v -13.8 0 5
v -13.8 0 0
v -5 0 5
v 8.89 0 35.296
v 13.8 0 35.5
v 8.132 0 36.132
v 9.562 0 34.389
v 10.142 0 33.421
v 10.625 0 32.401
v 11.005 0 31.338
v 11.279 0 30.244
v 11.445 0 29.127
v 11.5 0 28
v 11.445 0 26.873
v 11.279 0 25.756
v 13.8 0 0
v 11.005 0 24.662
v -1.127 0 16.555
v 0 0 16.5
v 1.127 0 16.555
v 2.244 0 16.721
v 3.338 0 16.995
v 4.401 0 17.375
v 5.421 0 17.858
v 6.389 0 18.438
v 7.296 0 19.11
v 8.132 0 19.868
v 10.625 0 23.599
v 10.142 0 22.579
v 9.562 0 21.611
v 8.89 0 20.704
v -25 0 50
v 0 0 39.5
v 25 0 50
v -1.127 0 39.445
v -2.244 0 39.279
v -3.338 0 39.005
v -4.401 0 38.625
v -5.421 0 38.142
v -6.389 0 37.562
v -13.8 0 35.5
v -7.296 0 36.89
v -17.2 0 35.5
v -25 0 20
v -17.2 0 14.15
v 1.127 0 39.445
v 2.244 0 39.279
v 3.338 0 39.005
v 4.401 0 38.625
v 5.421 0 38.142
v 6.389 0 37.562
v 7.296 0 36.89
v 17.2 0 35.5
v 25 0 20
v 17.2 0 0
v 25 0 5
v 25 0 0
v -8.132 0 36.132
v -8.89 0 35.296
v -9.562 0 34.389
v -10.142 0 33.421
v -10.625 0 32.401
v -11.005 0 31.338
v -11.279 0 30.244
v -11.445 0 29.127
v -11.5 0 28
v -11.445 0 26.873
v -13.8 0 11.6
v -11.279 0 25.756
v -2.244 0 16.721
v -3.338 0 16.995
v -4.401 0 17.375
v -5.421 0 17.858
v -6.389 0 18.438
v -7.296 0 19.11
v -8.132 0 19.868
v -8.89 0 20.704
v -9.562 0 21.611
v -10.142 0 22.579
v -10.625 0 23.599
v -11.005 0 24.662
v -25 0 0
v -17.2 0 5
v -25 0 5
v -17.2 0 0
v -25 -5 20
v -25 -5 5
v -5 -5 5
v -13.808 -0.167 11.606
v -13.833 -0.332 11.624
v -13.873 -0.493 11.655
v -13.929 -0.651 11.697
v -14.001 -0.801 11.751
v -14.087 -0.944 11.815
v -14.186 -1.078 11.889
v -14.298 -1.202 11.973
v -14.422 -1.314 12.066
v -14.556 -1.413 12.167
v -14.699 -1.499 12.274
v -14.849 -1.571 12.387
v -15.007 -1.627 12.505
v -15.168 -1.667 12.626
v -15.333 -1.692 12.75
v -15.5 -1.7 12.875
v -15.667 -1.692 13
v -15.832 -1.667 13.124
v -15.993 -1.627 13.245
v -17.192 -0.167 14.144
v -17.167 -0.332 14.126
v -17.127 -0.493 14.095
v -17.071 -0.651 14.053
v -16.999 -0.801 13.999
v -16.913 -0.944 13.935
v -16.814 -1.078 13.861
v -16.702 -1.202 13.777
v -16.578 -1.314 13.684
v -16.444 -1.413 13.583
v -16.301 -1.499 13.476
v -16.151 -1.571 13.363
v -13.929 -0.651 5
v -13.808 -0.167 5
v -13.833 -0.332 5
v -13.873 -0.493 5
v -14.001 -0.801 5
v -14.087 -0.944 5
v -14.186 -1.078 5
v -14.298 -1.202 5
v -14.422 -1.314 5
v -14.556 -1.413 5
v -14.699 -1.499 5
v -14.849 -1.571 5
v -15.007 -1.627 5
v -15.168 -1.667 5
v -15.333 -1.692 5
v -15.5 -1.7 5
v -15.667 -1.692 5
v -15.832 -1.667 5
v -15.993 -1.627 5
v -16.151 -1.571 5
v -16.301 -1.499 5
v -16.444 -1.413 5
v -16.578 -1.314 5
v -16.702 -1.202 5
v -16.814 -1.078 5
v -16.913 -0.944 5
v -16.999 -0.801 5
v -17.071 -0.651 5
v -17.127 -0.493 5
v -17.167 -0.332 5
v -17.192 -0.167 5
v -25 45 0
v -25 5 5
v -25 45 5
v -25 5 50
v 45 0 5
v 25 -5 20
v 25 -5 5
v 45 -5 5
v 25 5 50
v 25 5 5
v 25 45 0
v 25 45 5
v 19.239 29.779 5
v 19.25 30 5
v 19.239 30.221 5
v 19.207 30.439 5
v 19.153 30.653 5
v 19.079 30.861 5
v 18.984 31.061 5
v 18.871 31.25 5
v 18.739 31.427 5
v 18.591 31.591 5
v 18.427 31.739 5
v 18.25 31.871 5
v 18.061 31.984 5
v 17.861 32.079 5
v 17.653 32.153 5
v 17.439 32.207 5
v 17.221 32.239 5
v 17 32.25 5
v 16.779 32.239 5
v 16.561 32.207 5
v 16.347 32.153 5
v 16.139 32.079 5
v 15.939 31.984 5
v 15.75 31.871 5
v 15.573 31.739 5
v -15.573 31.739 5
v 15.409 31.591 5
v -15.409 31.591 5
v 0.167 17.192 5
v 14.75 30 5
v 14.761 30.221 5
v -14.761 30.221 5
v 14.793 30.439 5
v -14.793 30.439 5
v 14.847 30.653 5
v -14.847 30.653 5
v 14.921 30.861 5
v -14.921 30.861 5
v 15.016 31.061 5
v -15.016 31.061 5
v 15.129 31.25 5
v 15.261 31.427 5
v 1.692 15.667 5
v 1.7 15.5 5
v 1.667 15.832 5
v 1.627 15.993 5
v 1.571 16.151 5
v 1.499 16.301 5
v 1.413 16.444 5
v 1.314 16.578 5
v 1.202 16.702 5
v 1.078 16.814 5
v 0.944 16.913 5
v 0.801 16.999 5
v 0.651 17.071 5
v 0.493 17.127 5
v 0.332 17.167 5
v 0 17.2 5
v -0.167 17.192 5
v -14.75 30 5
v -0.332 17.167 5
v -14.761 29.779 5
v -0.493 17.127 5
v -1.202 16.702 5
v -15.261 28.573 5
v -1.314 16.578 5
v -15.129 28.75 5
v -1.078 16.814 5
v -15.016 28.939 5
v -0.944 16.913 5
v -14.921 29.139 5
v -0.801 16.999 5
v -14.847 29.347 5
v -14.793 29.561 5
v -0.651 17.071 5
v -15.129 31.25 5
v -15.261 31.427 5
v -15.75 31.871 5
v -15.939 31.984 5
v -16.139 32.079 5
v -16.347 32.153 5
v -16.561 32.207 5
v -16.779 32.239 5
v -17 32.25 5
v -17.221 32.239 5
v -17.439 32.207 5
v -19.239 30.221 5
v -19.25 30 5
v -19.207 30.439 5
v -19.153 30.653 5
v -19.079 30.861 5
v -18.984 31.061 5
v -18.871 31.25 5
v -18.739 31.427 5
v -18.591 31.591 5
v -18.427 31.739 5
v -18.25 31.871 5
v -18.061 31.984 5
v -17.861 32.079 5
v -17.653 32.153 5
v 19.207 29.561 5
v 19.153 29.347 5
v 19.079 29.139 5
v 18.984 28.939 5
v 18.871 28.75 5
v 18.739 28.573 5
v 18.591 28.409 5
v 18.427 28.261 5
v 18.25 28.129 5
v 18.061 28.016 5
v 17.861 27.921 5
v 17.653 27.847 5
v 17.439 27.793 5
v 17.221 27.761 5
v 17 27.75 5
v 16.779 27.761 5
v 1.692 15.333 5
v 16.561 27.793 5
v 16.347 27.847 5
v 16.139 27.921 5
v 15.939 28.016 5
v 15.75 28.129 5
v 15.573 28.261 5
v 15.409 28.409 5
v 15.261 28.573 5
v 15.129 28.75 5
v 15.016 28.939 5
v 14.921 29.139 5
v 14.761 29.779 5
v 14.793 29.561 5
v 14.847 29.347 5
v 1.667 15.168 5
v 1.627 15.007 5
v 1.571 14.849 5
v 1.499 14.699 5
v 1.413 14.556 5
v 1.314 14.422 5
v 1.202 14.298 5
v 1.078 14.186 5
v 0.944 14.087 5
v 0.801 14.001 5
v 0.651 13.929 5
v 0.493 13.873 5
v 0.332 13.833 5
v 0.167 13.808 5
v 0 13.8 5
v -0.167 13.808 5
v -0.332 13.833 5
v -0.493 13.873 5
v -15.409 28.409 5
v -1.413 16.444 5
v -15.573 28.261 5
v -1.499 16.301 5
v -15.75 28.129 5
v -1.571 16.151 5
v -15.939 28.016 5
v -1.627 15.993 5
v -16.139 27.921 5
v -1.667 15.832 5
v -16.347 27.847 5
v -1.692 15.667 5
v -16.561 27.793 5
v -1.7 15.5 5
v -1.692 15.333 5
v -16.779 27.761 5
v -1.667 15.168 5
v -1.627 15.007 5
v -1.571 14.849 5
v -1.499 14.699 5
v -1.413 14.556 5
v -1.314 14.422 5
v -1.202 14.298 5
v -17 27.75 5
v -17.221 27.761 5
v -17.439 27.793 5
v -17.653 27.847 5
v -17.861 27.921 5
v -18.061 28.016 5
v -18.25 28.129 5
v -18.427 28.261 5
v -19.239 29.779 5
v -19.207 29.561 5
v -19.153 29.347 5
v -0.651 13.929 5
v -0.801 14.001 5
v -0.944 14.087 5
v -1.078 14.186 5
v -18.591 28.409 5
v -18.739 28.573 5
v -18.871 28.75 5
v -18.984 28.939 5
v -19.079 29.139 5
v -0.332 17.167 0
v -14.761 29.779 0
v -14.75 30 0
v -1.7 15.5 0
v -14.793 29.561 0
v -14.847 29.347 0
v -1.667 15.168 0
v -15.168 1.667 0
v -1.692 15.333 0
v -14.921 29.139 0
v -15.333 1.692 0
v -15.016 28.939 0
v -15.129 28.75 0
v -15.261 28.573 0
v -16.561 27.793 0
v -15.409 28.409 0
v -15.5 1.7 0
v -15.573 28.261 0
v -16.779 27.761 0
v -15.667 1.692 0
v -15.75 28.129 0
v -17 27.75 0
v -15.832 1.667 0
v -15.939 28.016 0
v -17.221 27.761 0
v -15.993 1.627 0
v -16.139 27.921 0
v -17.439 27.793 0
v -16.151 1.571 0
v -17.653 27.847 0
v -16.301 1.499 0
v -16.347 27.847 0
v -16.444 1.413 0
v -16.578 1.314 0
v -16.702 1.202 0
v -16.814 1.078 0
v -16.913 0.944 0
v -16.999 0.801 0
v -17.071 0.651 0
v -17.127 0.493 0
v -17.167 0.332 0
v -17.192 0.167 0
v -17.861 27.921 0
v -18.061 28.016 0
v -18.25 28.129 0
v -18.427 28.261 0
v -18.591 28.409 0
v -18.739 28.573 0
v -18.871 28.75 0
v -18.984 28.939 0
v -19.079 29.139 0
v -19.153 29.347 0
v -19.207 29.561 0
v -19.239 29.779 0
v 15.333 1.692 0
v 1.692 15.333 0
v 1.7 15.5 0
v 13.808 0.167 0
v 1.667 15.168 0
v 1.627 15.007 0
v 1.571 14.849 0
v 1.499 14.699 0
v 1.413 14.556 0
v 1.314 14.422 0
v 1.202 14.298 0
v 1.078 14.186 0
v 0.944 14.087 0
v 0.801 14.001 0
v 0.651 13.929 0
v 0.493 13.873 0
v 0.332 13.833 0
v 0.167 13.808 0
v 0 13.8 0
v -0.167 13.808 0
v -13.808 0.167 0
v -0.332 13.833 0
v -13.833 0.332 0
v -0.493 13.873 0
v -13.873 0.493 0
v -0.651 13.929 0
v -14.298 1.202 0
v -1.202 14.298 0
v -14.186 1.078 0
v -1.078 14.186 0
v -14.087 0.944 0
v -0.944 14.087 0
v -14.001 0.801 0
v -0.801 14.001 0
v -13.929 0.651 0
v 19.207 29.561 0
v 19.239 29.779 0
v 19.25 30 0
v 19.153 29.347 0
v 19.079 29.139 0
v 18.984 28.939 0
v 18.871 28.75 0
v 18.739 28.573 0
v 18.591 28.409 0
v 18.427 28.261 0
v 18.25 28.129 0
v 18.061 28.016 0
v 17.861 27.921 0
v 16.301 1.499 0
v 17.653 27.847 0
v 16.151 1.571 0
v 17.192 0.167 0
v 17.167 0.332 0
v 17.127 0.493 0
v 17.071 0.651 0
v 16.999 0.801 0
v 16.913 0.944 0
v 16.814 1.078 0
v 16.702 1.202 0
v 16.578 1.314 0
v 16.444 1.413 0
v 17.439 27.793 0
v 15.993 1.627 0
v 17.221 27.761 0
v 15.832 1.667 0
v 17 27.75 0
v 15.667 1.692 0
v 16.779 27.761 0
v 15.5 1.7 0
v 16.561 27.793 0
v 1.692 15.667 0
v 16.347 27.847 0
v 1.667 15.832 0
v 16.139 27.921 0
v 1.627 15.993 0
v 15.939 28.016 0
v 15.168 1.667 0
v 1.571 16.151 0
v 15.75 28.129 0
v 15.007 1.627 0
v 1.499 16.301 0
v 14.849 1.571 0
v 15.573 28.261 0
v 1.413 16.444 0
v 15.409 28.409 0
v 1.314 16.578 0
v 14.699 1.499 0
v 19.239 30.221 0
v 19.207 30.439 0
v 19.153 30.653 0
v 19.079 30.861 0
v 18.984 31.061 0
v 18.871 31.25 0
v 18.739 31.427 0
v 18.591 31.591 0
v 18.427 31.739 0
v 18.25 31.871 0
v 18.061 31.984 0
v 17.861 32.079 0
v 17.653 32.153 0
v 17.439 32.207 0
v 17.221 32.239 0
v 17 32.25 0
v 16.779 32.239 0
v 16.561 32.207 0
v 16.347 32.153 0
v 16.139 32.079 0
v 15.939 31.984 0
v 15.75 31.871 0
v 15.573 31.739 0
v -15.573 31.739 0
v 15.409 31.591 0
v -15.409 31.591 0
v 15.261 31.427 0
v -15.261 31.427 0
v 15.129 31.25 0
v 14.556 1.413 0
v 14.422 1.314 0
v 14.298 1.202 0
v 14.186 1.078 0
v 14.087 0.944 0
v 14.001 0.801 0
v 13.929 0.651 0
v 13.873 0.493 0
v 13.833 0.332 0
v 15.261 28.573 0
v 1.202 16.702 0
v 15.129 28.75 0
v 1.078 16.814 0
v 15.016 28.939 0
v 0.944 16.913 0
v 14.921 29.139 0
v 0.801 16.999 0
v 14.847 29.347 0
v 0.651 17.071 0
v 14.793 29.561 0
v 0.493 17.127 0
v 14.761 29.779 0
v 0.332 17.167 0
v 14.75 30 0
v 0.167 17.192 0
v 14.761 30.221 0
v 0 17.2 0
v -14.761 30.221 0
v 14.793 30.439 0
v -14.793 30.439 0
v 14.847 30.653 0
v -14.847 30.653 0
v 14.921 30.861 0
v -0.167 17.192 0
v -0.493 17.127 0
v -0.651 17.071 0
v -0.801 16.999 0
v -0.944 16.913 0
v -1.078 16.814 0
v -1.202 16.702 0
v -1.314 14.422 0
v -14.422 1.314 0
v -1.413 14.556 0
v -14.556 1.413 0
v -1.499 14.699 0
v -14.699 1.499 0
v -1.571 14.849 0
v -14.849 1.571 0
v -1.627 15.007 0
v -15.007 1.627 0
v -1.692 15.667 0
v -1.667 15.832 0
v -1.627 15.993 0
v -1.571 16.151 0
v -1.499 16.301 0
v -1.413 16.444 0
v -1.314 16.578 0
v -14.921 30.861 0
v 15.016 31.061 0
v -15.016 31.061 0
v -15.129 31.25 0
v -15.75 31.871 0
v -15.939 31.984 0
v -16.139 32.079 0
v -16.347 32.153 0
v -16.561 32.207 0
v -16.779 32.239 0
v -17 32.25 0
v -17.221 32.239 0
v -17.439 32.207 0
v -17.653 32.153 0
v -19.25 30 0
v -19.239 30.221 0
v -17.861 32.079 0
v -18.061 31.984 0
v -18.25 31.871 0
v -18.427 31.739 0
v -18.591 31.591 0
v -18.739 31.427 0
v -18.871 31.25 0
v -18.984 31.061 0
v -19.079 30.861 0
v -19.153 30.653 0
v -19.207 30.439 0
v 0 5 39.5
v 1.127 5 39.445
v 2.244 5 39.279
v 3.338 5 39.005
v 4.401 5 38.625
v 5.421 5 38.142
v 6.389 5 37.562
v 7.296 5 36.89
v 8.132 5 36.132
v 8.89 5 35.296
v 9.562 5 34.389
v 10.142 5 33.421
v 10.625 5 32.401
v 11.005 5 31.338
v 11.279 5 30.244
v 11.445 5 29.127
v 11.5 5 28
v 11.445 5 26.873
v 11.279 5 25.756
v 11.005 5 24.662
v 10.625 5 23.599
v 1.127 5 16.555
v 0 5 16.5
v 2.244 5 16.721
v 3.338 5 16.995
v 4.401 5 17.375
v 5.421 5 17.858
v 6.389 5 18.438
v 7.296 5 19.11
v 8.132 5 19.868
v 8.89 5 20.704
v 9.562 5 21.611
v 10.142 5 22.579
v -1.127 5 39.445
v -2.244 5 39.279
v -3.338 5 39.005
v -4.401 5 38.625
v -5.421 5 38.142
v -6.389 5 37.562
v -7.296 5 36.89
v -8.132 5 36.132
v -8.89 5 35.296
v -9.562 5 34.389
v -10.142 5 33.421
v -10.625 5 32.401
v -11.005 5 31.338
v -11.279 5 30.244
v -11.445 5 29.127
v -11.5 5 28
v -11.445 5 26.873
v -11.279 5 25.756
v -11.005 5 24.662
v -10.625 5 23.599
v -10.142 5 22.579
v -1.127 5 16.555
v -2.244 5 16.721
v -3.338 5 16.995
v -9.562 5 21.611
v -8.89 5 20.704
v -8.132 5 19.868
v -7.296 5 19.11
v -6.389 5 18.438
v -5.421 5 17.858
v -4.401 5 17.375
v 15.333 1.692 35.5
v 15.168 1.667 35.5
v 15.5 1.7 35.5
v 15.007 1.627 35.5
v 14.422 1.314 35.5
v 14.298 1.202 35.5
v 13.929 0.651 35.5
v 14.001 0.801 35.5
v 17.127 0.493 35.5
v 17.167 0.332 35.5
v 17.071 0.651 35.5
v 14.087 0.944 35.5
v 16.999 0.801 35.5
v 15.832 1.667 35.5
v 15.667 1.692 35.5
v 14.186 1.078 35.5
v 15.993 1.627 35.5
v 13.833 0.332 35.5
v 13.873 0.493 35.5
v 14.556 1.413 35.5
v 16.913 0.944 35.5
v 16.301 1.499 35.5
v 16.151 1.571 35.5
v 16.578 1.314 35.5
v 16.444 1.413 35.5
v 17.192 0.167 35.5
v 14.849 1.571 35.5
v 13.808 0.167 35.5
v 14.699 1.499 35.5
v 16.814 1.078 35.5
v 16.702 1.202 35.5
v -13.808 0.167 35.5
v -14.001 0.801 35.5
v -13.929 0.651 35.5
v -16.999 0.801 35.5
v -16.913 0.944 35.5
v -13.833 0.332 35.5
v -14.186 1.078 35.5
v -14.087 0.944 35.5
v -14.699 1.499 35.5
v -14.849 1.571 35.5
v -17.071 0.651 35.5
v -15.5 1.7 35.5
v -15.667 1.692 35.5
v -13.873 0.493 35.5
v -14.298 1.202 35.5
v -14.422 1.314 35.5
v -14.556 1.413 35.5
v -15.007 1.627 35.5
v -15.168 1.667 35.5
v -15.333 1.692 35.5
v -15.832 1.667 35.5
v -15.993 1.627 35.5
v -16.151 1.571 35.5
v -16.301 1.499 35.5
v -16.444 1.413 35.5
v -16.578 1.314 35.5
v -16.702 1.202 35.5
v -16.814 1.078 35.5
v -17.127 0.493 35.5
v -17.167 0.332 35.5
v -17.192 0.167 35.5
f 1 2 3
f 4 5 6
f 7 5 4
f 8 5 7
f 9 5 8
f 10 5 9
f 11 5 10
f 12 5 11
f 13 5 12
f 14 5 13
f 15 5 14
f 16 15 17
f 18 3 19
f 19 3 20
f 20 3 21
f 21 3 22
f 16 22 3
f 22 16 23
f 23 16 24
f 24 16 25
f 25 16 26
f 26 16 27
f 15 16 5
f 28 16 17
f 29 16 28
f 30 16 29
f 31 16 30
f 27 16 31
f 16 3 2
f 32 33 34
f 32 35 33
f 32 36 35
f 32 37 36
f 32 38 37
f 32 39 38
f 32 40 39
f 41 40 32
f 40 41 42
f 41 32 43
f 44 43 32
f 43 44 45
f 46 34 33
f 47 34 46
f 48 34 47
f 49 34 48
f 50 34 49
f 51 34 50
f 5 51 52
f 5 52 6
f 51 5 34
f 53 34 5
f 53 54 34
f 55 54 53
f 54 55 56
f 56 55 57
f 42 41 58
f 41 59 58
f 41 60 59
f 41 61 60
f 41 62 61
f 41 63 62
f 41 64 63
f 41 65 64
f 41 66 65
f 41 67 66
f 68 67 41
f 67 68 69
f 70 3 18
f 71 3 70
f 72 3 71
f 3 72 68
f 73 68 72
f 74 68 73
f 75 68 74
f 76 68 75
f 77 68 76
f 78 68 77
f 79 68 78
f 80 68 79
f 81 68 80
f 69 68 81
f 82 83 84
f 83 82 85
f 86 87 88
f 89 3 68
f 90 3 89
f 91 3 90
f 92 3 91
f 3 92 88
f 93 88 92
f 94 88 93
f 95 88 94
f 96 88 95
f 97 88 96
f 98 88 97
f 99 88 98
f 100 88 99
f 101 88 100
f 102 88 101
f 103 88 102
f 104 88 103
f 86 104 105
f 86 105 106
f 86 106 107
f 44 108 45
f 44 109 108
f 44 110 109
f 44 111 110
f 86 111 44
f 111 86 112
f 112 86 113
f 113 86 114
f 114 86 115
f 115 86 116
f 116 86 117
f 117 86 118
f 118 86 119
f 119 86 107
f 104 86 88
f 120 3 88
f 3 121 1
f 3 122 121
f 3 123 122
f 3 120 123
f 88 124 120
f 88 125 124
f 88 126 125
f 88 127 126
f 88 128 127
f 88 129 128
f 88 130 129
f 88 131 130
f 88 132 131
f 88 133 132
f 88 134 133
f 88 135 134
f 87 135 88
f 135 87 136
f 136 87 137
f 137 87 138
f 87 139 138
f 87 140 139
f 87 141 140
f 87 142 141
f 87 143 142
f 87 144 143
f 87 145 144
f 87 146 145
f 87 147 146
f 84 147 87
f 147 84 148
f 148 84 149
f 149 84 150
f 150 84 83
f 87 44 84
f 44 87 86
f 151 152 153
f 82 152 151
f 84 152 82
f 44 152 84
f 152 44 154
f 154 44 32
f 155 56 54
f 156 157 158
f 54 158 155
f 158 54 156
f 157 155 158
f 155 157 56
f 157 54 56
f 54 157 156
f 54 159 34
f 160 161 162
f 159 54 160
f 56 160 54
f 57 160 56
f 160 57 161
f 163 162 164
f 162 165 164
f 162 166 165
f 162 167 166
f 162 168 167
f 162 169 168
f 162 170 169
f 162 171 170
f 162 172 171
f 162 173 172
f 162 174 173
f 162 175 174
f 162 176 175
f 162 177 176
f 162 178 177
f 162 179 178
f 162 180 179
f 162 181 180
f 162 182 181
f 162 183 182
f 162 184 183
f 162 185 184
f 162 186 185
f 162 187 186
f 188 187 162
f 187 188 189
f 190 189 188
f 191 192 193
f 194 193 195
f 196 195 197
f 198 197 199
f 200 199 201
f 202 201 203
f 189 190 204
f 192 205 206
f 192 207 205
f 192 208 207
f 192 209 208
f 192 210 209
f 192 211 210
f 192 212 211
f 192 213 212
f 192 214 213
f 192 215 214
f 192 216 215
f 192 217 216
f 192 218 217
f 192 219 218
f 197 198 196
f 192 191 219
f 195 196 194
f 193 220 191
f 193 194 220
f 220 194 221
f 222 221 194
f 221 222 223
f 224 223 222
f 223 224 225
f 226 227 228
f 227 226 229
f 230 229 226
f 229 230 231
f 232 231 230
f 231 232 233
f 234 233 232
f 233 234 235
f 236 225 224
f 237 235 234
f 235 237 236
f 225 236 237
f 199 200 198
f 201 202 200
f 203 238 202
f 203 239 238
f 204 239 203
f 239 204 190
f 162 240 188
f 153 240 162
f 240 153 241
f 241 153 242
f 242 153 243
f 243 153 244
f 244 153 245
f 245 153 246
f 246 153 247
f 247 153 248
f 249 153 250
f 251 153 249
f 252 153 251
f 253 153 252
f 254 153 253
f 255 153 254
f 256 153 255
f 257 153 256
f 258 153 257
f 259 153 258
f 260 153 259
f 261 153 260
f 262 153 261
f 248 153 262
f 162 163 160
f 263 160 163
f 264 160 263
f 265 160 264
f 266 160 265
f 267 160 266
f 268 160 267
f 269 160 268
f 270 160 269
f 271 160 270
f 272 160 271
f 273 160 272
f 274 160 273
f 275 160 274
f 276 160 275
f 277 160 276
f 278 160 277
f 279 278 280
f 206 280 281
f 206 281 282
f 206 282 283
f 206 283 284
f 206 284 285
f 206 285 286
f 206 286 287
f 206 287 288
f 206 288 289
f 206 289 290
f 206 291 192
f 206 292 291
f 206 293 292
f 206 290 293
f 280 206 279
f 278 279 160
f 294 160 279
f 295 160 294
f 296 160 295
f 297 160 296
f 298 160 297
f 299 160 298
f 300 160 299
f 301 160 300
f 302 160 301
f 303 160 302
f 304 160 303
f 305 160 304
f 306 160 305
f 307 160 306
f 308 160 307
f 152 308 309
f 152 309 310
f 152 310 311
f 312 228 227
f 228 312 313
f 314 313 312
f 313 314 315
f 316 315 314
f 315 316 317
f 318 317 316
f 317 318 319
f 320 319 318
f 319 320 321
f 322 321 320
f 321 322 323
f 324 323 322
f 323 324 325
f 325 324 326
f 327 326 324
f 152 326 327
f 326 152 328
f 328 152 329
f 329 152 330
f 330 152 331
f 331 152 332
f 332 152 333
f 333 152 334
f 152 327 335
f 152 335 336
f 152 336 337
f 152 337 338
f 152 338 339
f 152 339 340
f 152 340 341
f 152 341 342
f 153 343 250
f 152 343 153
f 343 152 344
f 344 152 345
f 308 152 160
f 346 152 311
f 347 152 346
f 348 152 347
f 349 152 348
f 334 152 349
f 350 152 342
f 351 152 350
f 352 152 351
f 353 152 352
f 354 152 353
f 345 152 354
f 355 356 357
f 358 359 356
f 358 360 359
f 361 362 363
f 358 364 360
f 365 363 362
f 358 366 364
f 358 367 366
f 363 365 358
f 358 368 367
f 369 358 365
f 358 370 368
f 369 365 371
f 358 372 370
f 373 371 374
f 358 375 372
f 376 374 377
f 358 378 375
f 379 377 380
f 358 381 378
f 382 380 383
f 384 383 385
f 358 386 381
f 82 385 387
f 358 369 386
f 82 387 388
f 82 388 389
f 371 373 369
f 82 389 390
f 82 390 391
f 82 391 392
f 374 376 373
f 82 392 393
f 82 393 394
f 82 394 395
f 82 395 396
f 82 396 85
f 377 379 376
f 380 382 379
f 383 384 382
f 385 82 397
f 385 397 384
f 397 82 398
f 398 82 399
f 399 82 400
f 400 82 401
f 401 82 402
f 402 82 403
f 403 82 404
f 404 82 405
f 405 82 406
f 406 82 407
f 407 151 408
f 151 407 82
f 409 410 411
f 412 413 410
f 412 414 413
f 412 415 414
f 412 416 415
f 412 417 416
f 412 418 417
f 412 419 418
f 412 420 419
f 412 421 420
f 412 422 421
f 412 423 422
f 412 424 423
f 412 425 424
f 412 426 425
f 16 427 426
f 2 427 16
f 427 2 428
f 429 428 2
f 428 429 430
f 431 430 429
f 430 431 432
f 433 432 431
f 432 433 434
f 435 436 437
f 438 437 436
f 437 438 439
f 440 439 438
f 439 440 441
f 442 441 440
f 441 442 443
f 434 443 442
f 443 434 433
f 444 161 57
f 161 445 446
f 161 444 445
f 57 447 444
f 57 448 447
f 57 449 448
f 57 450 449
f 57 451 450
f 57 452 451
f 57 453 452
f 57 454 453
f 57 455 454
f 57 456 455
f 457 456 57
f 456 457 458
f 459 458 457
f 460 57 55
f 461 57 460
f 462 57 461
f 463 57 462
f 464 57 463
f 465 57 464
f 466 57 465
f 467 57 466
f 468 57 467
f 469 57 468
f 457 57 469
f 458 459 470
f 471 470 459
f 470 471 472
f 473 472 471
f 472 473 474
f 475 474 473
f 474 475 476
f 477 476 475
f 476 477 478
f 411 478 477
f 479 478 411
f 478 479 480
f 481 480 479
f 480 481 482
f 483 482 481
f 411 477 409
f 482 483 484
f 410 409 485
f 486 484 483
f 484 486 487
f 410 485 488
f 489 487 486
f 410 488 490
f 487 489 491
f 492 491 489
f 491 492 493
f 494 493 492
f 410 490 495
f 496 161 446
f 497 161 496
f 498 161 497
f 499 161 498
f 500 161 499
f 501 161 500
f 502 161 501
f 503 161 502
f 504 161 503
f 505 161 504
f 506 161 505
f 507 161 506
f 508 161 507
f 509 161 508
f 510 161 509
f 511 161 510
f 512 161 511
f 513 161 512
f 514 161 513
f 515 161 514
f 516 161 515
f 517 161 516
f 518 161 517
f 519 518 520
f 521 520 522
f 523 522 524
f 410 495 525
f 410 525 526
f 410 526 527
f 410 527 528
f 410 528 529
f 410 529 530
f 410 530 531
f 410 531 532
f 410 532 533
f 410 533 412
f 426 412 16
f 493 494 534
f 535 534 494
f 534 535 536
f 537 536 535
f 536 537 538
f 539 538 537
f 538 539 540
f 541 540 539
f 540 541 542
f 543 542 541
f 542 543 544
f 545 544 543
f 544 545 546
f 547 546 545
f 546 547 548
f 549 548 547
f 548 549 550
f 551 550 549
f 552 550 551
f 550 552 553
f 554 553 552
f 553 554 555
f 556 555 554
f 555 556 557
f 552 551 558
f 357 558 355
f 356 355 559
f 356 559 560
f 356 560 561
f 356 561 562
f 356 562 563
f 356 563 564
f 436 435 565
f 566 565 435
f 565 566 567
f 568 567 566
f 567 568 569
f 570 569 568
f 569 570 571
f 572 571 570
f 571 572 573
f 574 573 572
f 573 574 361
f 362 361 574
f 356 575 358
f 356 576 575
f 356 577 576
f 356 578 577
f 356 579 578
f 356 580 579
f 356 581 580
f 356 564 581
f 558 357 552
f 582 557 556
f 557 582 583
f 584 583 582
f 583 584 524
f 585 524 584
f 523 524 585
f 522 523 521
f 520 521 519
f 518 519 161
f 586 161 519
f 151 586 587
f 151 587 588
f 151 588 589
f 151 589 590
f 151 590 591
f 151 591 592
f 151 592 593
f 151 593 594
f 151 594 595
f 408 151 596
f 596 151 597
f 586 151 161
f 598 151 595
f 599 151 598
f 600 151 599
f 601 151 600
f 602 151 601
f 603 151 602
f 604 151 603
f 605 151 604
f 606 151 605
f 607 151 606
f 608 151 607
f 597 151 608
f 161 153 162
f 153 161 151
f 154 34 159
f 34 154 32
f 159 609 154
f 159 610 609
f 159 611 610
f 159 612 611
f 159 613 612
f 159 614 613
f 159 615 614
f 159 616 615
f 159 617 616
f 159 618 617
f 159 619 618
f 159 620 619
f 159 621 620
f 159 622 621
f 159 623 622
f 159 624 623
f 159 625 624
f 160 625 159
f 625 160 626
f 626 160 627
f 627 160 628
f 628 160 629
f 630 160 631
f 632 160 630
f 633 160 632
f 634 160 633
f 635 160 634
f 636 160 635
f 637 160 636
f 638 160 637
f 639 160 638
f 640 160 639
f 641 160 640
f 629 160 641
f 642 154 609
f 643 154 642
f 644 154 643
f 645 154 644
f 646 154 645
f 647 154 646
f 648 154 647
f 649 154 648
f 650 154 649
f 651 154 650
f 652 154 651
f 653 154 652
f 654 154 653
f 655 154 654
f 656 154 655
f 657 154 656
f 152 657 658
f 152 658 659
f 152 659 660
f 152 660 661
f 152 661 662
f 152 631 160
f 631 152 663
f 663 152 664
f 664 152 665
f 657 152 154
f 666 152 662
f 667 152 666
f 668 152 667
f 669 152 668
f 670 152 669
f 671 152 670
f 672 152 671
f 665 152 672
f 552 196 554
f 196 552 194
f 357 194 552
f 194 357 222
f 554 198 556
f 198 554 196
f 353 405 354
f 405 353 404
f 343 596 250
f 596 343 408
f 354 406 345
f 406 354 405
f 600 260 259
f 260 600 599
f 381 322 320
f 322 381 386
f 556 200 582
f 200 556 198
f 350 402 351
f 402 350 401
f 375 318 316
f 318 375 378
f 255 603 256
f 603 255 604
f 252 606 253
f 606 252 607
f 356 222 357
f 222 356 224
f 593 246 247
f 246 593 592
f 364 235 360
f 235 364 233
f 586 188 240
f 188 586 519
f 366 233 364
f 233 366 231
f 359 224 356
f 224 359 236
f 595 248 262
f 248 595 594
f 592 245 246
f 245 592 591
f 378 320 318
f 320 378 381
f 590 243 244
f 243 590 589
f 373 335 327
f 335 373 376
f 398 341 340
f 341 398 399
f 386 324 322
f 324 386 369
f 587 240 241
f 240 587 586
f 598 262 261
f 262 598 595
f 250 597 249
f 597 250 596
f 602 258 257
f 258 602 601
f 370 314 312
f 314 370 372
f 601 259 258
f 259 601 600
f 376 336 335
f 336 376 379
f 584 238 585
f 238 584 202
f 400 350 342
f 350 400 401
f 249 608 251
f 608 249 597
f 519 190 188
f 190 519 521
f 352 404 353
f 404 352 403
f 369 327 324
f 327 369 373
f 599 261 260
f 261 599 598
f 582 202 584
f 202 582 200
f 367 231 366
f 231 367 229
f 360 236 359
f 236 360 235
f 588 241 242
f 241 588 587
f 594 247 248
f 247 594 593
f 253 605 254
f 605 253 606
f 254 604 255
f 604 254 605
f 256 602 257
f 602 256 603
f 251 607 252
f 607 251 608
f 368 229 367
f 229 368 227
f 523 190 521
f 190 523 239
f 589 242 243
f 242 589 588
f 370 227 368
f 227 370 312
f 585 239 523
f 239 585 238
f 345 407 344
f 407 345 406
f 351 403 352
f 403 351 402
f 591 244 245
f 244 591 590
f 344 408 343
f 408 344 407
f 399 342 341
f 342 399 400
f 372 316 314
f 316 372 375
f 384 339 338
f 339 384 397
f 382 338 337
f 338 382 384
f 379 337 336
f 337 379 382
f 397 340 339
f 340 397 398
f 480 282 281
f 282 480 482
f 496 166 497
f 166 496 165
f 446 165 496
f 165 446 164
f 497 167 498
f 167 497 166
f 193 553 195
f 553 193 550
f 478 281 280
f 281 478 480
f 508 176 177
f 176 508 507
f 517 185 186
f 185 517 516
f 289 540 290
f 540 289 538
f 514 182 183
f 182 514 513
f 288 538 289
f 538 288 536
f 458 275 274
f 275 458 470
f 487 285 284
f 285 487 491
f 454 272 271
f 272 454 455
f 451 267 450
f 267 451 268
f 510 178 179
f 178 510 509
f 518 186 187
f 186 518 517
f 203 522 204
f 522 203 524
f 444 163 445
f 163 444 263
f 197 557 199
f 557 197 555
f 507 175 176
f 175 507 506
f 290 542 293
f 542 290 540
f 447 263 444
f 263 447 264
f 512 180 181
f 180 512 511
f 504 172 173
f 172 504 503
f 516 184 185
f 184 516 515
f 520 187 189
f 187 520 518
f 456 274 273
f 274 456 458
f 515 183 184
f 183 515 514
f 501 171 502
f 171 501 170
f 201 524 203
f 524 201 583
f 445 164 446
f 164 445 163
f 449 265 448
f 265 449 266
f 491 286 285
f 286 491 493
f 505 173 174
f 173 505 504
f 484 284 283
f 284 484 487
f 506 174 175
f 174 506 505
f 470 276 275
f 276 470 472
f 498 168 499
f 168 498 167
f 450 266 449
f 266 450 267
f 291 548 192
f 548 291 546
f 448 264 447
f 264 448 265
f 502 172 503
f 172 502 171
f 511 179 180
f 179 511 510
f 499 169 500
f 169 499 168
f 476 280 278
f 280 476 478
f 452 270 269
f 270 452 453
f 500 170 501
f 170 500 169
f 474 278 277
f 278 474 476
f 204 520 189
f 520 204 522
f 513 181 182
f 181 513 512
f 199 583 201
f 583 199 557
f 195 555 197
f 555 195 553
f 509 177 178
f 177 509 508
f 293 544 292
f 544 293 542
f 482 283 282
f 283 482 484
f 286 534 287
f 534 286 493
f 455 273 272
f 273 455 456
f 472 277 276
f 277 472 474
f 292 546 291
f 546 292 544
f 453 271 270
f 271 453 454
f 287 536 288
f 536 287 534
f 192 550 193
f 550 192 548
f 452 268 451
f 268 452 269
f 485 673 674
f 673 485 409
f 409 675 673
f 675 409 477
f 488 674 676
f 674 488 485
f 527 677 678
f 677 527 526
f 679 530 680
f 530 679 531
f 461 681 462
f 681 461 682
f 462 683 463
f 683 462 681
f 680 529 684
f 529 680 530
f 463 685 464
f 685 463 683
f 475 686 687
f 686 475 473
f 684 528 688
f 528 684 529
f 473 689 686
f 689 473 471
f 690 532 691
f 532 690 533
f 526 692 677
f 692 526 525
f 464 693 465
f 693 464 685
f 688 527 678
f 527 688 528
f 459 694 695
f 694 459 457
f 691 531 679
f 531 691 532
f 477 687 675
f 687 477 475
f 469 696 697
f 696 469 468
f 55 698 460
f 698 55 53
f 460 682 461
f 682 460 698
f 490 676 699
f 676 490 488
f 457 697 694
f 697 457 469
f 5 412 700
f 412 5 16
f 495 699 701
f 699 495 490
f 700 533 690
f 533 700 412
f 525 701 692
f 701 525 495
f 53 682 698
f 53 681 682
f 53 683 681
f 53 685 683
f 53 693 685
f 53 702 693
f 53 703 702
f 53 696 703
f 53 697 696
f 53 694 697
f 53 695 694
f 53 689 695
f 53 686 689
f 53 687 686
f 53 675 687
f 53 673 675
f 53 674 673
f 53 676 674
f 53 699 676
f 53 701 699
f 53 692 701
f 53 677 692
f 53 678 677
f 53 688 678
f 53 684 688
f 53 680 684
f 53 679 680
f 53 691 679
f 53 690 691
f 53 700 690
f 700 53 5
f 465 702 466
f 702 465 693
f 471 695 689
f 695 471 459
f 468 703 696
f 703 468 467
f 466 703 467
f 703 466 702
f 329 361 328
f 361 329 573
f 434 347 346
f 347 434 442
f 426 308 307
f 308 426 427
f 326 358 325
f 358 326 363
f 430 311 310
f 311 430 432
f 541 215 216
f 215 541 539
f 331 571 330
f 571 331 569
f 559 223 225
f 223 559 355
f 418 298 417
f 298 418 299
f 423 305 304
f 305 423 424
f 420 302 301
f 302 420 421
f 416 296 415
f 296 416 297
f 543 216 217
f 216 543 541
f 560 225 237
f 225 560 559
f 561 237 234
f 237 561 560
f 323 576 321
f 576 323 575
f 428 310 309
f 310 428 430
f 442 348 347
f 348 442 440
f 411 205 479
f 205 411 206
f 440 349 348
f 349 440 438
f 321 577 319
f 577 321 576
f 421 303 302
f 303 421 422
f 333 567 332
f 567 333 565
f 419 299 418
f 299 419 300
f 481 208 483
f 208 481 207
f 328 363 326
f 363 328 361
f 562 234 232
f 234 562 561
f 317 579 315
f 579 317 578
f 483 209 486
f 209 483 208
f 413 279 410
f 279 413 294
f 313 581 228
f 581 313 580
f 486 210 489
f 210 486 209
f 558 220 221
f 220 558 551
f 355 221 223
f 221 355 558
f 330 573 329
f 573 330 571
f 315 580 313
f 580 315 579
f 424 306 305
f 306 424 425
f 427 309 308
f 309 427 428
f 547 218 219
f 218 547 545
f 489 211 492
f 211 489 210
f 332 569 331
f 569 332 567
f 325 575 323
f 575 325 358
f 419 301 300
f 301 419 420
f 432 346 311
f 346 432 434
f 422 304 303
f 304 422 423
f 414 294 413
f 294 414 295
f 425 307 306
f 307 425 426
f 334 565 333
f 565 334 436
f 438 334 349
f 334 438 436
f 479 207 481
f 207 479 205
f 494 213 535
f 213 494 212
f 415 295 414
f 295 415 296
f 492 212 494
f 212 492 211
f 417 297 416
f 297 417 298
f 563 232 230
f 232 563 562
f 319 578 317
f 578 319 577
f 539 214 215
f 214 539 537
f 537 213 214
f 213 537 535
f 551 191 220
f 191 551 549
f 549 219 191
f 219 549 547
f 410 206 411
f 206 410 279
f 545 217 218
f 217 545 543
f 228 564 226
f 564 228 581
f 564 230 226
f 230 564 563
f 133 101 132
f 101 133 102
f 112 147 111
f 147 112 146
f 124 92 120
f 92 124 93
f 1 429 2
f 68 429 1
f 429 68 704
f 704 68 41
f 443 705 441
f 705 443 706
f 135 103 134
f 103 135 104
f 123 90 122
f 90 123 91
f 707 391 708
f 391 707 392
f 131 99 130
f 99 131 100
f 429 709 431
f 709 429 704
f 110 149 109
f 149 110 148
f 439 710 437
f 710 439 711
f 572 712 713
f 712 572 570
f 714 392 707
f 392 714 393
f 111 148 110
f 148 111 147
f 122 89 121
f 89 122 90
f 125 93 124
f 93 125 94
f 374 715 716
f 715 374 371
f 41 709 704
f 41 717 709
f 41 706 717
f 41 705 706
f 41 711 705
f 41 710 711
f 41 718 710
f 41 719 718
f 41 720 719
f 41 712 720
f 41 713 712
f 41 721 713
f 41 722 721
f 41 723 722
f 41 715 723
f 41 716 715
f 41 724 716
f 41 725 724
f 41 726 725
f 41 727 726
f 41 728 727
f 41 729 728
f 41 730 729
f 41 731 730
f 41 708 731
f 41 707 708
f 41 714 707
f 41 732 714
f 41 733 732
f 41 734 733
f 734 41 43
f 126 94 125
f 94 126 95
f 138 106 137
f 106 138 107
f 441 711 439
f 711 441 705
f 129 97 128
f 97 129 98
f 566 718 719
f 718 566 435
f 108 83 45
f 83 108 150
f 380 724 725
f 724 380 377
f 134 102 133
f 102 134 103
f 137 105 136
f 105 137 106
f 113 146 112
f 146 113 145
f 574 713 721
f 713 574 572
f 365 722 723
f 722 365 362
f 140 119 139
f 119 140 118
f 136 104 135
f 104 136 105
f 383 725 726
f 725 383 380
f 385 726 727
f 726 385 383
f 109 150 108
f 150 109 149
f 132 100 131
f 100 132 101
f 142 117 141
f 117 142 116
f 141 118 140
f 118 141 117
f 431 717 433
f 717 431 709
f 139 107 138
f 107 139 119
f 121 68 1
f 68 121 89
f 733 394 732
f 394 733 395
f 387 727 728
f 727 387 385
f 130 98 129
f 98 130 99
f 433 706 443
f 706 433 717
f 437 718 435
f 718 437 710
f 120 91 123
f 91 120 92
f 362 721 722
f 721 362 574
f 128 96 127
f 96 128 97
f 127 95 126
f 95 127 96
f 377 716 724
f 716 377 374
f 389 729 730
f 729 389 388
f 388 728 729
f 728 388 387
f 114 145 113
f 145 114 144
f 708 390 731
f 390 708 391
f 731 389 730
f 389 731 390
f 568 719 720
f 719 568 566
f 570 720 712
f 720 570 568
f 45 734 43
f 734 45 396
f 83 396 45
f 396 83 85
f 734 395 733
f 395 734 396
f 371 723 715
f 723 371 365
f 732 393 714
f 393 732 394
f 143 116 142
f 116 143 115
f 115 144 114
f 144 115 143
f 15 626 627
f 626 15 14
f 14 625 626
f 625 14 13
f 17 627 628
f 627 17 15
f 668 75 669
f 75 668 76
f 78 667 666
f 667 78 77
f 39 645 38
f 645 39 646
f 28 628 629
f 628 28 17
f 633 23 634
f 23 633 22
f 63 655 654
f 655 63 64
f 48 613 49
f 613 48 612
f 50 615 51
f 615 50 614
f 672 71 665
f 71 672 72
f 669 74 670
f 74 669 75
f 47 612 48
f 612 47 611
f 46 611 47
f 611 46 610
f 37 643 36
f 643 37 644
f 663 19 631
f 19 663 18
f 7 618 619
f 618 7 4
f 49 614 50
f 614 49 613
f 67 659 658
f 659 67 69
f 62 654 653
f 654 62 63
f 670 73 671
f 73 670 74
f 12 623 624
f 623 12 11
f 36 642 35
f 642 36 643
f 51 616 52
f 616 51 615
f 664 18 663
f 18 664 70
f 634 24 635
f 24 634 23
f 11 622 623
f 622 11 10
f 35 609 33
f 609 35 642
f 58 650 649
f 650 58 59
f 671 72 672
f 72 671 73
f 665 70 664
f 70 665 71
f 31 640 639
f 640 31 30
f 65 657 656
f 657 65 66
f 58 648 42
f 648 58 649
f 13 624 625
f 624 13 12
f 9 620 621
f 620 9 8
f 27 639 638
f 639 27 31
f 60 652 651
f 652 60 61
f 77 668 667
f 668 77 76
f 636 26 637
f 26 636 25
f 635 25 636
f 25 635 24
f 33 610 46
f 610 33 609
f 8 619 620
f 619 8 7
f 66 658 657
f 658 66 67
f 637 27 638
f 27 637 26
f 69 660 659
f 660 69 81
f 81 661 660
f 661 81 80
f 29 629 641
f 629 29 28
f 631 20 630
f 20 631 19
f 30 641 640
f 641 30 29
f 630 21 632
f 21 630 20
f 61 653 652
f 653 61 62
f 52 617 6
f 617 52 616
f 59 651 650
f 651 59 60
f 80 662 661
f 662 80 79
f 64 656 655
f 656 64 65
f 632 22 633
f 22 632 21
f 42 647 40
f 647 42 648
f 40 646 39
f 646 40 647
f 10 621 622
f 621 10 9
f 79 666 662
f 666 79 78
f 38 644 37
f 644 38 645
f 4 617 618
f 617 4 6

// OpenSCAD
// L-shaped mounting bracket for a NEMA 17 stepper motor (e.g. syringe pump)
// Print orientation: base plate on the bed, motor plate building upward (+Z)

$fn = 64;

// ---------------- Dimensions (mm) ----------------
// Base plate
base_x0 = -25;    // base plate x start
base_x1 = 25;     // base plate x end
base_y0 = 0;      // base plate y start
base_y1 = 45;     // base plate y end
base_z1 = 5;      // base plate thickness (z 0..5)

// Motor plate
motor_x0 = -25;   // motor plate x start
motor_x1 = 25;    // motor plate x end
motor_y0 = 0;     // motor plate y start
motor_y1 = 5;     // motor plate y end (z 0..50)
motor_z1 = 50;    // motor plate height

// Through-holes
hole_m4_x = [-17, 17]; // M4 holes at x = -17 and x = 17
hole_m4_y = 30;      // M4 holes at y = 30
hole_m4_d = 4.5;    // M4 hole diameter

// Motor boss hole
boss_d = 23;       // boss hole diameter (along Y)
boss_x = 0;        // boss hole centre x
boss_z = 28;       // boss hole centre z

// Screw holes
screw_d = 3.4;     // M3 screw hole diameter
screw_pitch = 31;  // square pattern side length
screw_count = 4;   // number of screw holes

// Gussets
gusset_t = 5;      // gusset thickness (X)
gusset_l = 20;     // triangle leg along +Y
gusset_h = 20;     // triangle leg along +Z
gusset_x0 = -25;   // left gusset x start
gusset_x1 = 25;    // right gusset x end

// ---------------- Model ----------------
difference() {
    union() {
        // Base plate
        translate([base_x0, base_y0, 0])
            cube([base_x1 - base_x0, base_y1 - base_y0, base_z1]);

        // Motor plate
        translate([motor_x0, motor_y0, 0])
            cube([motor_x1 - motor_x0, motor_y1 - motor_y0, motor_z1]);

        // Gussets: right triangle in YZ, flush with left/right edges
        for (x = [gusset_x0, gusset_x1])
            translate([x, 0, 0])
                rotate([90, 0, 0])
                    linear_extrude(height = gusset_t)
                        polygon([[0, 5], [gusset_l, 5], [0, gusset_h]]);
    }

    // M4 through-holes
    for (x = hole_m4_x)
        translate([x, hole_m4_y, -1])
            cylinder(d = hole_m4_d, h = base_z1 + motor_z1 + 2);

    // Boss hole for motor centring boss
    translate([boss_x, -1, boss_z])
        rotate([-90, 0, 0])
            cylinder(d = boss_d, h = motor_y1 - motor_y0 + 2);

    // M3 screw holes on square pattern centred on boss hole
    for (i = [0 : screw_count - 1]) {
        angle = i * 90;
        translate([boss_x, boss_x, -1])
            rotate([0, 0, angle])
                translate([0, -screw_pitch / 2, -screw_pitch / 2])
                    cylinder(d = screw_d, h = motor_z1 + 2);
    }
}
